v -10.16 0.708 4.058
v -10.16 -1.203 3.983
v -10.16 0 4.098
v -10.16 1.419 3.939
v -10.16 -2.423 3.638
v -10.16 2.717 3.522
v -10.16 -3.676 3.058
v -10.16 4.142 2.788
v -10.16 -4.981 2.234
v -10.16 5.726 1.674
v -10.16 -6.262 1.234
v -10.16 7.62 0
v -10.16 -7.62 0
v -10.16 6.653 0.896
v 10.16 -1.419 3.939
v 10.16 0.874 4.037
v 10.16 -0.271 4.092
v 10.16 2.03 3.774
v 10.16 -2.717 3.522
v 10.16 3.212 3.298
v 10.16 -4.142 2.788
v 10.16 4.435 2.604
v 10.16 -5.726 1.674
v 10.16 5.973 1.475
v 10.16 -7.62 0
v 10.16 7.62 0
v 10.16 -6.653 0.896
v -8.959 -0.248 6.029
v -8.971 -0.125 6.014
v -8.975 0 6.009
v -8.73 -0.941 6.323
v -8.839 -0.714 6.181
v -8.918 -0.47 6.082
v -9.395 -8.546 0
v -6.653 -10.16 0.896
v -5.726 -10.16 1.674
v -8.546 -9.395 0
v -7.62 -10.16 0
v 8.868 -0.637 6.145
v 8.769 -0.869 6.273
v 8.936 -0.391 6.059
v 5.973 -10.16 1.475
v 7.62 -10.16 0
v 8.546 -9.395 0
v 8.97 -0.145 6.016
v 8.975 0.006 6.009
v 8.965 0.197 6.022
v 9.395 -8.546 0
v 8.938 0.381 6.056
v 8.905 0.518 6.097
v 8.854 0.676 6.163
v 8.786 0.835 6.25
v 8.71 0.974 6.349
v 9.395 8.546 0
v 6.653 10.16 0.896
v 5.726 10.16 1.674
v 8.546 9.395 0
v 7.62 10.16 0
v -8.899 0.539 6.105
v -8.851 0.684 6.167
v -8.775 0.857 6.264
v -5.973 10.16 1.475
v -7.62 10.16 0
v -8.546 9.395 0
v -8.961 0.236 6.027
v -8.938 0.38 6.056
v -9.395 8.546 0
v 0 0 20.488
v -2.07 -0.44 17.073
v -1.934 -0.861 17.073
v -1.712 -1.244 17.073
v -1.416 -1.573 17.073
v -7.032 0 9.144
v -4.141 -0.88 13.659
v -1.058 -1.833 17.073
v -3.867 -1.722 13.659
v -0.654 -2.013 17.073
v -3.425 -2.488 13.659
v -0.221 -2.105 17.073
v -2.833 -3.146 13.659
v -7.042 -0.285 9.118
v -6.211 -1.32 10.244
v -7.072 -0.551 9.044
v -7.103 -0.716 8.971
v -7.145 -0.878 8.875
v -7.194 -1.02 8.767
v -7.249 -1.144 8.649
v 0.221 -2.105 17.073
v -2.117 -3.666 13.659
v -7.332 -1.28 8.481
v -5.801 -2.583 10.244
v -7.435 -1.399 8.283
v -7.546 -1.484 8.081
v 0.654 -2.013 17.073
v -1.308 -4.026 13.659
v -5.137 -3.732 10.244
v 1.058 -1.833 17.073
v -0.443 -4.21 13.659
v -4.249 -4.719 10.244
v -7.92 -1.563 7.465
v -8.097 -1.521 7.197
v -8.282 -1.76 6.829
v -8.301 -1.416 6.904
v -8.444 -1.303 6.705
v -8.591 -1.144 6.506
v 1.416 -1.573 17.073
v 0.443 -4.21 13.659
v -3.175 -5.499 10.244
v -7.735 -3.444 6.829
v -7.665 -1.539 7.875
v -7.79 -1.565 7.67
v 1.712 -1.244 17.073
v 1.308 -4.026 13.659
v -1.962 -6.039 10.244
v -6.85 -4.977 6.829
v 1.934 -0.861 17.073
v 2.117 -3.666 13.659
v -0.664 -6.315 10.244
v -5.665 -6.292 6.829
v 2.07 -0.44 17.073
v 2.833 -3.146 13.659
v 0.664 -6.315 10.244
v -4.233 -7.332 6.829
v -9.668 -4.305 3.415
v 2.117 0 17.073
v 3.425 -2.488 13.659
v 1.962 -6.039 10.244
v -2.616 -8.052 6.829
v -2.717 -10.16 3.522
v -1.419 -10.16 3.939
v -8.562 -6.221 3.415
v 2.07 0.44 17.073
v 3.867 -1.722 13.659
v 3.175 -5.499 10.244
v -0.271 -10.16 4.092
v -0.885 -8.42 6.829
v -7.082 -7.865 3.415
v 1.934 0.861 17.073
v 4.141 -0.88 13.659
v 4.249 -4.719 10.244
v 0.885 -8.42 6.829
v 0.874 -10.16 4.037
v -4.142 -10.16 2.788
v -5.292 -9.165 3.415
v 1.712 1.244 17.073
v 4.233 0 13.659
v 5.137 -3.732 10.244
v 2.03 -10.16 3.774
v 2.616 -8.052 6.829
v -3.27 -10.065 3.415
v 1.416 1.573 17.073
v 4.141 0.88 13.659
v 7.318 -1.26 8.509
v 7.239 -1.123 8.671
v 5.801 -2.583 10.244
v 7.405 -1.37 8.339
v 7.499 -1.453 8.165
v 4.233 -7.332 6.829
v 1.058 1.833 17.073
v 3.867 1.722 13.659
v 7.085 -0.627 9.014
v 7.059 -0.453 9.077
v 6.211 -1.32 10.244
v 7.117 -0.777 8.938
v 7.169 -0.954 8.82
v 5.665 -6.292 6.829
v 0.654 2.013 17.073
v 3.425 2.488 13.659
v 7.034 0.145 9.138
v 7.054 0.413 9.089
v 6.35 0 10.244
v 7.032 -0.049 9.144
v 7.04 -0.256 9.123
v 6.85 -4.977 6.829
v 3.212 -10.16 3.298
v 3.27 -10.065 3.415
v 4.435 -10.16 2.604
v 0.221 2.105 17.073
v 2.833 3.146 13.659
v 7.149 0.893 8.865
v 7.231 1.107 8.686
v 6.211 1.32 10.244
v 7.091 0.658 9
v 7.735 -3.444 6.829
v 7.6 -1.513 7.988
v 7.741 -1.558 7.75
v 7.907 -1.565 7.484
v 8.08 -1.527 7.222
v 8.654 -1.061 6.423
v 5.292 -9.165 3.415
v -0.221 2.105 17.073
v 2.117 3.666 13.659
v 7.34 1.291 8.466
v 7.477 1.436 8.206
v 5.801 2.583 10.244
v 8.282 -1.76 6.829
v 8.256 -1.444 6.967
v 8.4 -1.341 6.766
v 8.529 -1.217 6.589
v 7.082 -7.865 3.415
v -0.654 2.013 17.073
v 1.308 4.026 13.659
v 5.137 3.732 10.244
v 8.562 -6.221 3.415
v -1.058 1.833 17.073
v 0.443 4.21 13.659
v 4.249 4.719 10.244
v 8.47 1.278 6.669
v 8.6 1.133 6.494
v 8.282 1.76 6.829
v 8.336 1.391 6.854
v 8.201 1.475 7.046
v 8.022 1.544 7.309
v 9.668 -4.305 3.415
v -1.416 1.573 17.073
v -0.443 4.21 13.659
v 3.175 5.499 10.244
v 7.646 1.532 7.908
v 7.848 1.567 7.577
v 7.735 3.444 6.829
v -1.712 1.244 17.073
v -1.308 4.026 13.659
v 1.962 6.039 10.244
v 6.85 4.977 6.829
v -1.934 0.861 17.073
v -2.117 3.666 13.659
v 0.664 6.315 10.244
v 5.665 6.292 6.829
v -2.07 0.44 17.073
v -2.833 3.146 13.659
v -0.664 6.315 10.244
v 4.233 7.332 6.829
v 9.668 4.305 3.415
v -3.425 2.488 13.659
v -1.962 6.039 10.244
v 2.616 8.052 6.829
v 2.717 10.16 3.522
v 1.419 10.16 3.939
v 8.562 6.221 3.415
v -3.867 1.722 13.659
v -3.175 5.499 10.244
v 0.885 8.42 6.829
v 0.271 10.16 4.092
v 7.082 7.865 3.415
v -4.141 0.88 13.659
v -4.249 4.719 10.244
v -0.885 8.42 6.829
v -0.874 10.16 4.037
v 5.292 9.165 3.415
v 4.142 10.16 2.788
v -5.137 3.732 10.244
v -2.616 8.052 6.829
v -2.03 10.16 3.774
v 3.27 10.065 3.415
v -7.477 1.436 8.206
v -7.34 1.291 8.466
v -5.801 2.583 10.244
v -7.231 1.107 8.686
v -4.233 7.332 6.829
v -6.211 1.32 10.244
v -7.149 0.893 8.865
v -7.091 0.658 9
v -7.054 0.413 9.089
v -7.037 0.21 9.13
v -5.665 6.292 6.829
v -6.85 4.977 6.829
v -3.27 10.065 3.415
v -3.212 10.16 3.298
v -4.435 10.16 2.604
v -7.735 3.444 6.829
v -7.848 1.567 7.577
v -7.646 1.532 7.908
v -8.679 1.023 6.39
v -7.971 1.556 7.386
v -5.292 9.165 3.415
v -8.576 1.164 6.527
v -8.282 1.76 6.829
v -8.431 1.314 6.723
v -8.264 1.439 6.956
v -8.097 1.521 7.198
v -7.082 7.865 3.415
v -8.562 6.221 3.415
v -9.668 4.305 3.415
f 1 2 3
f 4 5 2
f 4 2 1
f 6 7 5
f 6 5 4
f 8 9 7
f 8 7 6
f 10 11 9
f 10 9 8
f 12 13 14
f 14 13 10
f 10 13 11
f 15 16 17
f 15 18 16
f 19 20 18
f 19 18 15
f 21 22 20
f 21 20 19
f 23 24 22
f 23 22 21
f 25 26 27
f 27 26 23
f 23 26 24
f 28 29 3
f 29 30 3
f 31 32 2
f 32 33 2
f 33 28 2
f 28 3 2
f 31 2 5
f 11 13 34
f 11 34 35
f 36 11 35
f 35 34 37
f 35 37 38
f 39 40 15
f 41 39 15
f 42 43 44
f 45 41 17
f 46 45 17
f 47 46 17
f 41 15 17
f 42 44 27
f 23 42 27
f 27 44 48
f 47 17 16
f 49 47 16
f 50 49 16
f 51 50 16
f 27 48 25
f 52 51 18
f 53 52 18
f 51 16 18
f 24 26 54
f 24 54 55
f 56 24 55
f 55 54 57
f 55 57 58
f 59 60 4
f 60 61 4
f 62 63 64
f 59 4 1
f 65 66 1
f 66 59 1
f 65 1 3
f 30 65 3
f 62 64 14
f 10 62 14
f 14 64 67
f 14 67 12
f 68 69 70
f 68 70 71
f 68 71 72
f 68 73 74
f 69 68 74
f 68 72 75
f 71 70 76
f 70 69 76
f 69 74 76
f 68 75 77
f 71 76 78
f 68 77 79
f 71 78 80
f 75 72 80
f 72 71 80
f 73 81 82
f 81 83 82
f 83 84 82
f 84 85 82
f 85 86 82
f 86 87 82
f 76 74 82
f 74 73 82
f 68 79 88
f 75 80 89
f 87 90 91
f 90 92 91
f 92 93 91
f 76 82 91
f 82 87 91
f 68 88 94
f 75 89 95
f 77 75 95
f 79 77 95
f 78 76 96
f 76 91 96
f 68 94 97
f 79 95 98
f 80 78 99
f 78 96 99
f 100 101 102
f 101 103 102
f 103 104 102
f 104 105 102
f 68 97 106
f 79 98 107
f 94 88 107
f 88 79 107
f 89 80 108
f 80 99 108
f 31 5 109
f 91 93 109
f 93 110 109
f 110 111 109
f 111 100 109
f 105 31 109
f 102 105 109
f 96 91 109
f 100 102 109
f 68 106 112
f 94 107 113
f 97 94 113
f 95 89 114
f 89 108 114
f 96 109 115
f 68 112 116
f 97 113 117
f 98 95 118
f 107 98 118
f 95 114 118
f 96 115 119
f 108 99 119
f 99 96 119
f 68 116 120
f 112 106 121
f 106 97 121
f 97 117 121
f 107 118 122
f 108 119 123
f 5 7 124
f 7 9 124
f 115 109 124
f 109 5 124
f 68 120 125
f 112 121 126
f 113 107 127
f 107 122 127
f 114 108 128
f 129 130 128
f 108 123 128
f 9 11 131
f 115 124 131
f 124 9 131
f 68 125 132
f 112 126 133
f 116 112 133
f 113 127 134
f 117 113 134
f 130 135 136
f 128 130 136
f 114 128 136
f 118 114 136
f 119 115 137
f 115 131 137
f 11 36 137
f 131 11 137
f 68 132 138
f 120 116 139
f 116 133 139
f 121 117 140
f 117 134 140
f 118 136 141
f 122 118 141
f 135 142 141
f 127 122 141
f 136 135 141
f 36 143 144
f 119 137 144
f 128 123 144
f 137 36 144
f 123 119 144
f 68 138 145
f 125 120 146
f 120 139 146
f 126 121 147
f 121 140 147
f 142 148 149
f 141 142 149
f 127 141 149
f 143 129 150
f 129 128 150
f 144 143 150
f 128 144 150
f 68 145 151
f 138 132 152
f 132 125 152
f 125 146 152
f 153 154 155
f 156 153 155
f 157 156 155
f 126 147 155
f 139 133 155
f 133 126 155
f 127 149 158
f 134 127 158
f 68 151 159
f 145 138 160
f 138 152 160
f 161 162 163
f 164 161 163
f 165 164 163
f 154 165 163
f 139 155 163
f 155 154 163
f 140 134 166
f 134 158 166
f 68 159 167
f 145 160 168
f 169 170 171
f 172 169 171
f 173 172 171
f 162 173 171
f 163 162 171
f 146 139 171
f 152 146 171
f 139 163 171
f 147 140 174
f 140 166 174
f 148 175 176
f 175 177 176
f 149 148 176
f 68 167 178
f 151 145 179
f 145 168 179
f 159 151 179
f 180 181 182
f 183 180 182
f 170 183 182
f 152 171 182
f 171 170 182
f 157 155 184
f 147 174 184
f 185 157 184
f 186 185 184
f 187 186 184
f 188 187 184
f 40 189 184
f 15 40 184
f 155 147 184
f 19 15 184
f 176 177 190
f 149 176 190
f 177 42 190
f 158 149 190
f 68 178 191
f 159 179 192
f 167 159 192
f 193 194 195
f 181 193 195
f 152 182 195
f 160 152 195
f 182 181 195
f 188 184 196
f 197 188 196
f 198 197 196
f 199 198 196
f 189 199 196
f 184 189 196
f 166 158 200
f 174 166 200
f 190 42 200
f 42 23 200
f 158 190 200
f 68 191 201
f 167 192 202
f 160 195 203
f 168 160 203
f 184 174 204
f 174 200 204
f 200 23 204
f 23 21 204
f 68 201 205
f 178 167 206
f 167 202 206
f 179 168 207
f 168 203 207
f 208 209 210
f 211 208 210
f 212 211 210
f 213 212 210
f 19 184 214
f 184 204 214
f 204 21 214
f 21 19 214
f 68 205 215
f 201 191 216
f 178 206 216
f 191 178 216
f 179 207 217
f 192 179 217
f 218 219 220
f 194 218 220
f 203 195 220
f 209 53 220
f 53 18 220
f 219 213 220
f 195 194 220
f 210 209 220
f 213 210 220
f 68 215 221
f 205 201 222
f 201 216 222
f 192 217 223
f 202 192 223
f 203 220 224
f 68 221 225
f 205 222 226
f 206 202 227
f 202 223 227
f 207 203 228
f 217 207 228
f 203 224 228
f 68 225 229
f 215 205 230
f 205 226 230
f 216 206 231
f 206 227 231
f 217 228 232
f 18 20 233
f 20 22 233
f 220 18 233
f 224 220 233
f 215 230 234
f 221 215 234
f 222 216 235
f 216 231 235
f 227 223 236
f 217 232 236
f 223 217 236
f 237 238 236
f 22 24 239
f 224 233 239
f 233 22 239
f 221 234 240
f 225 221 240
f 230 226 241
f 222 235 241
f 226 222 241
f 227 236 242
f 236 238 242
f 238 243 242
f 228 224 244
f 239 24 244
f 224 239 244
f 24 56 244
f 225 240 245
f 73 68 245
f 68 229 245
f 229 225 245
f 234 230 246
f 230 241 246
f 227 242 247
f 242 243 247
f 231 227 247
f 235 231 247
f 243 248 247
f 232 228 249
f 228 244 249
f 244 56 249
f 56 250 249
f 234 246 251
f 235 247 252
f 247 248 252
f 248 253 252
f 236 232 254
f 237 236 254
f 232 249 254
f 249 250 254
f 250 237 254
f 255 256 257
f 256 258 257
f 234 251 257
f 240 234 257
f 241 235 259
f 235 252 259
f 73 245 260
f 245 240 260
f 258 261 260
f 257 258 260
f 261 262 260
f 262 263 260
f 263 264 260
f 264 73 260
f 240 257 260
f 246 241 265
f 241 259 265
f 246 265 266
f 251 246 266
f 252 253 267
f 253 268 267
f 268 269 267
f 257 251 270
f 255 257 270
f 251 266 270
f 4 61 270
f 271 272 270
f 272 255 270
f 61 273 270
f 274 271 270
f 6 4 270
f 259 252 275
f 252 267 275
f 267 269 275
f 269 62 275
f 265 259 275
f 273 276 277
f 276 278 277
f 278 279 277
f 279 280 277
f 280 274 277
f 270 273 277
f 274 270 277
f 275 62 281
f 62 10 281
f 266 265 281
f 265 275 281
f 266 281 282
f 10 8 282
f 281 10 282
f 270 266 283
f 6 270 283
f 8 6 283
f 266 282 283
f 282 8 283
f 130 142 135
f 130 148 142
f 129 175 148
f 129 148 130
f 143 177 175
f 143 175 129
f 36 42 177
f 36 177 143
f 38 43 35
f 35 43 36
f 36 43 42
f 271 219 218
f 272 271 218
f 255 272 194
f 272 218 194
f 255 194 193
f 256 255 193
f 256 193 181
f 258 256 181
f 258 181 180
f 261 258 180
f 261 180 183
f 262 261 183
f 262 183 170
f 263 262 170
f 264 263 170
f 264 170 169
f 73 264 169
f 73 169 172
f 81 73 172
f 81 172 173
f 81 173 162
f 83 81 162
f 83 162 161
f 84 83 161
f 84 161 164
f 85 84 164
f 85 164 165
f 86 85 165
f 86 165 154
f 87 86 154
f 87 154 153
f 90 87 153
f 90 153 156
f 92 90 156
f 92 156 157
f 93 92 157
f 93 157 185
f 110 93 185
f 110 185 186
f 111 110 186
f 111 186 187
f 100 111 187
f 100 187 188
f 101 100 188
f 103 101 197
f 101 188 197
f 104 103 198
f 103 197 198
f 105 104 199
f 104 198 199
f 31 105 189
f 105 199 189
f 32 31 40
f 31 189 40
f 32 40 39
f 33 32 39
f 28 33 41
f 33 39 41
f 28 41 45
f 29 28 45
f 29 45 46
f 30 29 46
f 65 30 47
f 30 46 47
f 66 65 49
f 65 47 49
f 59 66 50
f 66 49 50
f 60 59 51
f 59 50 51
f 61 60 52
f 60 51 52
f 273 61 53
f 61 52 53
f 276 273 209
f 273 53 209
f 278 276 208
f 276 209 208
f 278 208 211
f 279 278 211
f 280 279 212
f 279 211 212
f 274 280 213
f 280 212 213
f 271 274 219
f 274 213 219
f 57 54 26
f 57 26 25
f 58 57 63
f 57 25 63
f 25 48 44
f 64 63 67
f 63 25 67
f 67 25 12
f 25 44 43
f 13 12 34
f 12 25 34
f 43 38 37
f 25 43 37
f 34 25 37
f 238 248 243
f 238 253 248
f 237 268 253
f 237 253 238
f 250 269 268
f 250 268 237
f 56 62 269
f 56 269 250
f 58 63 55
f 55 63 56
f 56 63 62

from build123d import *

# Parameters (mm, degrees)
F4_DEPTH = 25.4
F5_R     = 1.567458
F6_DEPTH = 12.7


with BuildPart() as f2:
    # F0 (on Front) → F2 (revolve)
    with BuildSketch(Plane.XZ):
        Polygon((-12.7, 0), (0, 0), (0, 20.487964), align=None)
    revolve(axis=Axis((0, 0, 41.735996), (0, 0, 1)))

    # F3 (on Top) → F4 (cut)
    with BuildSketch(Plane.XY):
        with BuildLine():
            Line((-8.870912, 10.16), (8.870912, 10.16))
            ThreePointArc((8.870912, 10.16), (0, 13.487723), (-8.870912, 10.16))
        make_face()
        with BuildLine():
            ThreePointArc((-8.870912, -10.16), (0, -13.487723), (8.870912, -10.16))
            Line((8.870912, -10.16), (-8.870912, -10.16))
        make_face()
        with BuildLine():
            ThreePointArc((10.16, -8.870912), (13.487723, 0), (10.16, 8.870912))
            Line((10.16, 8.870912), (10.16, -8.870912))
        make_face()
        with BuildLine():
            Line((-10.16, -8.870912), (-10.16, 8.870912))
            ThreePointArc((-10.16, 8.870912), (-13.487723, 0), (-10.16, -8.870912))
        make_face()
    extrude(amount=F4_DEPTH, mode=Mode.SUBTRACT)

    # F5 (on Right) → F6 (cut, symmetric)
    with BuildSketch(Plane.YZ):
        with Locations((0, 7.576898)):
            Circle(F5_R)
    extrude(amount=F6_DEPTH, both=True, mode=Mode.SUBTRACT)


solid = f2.part
